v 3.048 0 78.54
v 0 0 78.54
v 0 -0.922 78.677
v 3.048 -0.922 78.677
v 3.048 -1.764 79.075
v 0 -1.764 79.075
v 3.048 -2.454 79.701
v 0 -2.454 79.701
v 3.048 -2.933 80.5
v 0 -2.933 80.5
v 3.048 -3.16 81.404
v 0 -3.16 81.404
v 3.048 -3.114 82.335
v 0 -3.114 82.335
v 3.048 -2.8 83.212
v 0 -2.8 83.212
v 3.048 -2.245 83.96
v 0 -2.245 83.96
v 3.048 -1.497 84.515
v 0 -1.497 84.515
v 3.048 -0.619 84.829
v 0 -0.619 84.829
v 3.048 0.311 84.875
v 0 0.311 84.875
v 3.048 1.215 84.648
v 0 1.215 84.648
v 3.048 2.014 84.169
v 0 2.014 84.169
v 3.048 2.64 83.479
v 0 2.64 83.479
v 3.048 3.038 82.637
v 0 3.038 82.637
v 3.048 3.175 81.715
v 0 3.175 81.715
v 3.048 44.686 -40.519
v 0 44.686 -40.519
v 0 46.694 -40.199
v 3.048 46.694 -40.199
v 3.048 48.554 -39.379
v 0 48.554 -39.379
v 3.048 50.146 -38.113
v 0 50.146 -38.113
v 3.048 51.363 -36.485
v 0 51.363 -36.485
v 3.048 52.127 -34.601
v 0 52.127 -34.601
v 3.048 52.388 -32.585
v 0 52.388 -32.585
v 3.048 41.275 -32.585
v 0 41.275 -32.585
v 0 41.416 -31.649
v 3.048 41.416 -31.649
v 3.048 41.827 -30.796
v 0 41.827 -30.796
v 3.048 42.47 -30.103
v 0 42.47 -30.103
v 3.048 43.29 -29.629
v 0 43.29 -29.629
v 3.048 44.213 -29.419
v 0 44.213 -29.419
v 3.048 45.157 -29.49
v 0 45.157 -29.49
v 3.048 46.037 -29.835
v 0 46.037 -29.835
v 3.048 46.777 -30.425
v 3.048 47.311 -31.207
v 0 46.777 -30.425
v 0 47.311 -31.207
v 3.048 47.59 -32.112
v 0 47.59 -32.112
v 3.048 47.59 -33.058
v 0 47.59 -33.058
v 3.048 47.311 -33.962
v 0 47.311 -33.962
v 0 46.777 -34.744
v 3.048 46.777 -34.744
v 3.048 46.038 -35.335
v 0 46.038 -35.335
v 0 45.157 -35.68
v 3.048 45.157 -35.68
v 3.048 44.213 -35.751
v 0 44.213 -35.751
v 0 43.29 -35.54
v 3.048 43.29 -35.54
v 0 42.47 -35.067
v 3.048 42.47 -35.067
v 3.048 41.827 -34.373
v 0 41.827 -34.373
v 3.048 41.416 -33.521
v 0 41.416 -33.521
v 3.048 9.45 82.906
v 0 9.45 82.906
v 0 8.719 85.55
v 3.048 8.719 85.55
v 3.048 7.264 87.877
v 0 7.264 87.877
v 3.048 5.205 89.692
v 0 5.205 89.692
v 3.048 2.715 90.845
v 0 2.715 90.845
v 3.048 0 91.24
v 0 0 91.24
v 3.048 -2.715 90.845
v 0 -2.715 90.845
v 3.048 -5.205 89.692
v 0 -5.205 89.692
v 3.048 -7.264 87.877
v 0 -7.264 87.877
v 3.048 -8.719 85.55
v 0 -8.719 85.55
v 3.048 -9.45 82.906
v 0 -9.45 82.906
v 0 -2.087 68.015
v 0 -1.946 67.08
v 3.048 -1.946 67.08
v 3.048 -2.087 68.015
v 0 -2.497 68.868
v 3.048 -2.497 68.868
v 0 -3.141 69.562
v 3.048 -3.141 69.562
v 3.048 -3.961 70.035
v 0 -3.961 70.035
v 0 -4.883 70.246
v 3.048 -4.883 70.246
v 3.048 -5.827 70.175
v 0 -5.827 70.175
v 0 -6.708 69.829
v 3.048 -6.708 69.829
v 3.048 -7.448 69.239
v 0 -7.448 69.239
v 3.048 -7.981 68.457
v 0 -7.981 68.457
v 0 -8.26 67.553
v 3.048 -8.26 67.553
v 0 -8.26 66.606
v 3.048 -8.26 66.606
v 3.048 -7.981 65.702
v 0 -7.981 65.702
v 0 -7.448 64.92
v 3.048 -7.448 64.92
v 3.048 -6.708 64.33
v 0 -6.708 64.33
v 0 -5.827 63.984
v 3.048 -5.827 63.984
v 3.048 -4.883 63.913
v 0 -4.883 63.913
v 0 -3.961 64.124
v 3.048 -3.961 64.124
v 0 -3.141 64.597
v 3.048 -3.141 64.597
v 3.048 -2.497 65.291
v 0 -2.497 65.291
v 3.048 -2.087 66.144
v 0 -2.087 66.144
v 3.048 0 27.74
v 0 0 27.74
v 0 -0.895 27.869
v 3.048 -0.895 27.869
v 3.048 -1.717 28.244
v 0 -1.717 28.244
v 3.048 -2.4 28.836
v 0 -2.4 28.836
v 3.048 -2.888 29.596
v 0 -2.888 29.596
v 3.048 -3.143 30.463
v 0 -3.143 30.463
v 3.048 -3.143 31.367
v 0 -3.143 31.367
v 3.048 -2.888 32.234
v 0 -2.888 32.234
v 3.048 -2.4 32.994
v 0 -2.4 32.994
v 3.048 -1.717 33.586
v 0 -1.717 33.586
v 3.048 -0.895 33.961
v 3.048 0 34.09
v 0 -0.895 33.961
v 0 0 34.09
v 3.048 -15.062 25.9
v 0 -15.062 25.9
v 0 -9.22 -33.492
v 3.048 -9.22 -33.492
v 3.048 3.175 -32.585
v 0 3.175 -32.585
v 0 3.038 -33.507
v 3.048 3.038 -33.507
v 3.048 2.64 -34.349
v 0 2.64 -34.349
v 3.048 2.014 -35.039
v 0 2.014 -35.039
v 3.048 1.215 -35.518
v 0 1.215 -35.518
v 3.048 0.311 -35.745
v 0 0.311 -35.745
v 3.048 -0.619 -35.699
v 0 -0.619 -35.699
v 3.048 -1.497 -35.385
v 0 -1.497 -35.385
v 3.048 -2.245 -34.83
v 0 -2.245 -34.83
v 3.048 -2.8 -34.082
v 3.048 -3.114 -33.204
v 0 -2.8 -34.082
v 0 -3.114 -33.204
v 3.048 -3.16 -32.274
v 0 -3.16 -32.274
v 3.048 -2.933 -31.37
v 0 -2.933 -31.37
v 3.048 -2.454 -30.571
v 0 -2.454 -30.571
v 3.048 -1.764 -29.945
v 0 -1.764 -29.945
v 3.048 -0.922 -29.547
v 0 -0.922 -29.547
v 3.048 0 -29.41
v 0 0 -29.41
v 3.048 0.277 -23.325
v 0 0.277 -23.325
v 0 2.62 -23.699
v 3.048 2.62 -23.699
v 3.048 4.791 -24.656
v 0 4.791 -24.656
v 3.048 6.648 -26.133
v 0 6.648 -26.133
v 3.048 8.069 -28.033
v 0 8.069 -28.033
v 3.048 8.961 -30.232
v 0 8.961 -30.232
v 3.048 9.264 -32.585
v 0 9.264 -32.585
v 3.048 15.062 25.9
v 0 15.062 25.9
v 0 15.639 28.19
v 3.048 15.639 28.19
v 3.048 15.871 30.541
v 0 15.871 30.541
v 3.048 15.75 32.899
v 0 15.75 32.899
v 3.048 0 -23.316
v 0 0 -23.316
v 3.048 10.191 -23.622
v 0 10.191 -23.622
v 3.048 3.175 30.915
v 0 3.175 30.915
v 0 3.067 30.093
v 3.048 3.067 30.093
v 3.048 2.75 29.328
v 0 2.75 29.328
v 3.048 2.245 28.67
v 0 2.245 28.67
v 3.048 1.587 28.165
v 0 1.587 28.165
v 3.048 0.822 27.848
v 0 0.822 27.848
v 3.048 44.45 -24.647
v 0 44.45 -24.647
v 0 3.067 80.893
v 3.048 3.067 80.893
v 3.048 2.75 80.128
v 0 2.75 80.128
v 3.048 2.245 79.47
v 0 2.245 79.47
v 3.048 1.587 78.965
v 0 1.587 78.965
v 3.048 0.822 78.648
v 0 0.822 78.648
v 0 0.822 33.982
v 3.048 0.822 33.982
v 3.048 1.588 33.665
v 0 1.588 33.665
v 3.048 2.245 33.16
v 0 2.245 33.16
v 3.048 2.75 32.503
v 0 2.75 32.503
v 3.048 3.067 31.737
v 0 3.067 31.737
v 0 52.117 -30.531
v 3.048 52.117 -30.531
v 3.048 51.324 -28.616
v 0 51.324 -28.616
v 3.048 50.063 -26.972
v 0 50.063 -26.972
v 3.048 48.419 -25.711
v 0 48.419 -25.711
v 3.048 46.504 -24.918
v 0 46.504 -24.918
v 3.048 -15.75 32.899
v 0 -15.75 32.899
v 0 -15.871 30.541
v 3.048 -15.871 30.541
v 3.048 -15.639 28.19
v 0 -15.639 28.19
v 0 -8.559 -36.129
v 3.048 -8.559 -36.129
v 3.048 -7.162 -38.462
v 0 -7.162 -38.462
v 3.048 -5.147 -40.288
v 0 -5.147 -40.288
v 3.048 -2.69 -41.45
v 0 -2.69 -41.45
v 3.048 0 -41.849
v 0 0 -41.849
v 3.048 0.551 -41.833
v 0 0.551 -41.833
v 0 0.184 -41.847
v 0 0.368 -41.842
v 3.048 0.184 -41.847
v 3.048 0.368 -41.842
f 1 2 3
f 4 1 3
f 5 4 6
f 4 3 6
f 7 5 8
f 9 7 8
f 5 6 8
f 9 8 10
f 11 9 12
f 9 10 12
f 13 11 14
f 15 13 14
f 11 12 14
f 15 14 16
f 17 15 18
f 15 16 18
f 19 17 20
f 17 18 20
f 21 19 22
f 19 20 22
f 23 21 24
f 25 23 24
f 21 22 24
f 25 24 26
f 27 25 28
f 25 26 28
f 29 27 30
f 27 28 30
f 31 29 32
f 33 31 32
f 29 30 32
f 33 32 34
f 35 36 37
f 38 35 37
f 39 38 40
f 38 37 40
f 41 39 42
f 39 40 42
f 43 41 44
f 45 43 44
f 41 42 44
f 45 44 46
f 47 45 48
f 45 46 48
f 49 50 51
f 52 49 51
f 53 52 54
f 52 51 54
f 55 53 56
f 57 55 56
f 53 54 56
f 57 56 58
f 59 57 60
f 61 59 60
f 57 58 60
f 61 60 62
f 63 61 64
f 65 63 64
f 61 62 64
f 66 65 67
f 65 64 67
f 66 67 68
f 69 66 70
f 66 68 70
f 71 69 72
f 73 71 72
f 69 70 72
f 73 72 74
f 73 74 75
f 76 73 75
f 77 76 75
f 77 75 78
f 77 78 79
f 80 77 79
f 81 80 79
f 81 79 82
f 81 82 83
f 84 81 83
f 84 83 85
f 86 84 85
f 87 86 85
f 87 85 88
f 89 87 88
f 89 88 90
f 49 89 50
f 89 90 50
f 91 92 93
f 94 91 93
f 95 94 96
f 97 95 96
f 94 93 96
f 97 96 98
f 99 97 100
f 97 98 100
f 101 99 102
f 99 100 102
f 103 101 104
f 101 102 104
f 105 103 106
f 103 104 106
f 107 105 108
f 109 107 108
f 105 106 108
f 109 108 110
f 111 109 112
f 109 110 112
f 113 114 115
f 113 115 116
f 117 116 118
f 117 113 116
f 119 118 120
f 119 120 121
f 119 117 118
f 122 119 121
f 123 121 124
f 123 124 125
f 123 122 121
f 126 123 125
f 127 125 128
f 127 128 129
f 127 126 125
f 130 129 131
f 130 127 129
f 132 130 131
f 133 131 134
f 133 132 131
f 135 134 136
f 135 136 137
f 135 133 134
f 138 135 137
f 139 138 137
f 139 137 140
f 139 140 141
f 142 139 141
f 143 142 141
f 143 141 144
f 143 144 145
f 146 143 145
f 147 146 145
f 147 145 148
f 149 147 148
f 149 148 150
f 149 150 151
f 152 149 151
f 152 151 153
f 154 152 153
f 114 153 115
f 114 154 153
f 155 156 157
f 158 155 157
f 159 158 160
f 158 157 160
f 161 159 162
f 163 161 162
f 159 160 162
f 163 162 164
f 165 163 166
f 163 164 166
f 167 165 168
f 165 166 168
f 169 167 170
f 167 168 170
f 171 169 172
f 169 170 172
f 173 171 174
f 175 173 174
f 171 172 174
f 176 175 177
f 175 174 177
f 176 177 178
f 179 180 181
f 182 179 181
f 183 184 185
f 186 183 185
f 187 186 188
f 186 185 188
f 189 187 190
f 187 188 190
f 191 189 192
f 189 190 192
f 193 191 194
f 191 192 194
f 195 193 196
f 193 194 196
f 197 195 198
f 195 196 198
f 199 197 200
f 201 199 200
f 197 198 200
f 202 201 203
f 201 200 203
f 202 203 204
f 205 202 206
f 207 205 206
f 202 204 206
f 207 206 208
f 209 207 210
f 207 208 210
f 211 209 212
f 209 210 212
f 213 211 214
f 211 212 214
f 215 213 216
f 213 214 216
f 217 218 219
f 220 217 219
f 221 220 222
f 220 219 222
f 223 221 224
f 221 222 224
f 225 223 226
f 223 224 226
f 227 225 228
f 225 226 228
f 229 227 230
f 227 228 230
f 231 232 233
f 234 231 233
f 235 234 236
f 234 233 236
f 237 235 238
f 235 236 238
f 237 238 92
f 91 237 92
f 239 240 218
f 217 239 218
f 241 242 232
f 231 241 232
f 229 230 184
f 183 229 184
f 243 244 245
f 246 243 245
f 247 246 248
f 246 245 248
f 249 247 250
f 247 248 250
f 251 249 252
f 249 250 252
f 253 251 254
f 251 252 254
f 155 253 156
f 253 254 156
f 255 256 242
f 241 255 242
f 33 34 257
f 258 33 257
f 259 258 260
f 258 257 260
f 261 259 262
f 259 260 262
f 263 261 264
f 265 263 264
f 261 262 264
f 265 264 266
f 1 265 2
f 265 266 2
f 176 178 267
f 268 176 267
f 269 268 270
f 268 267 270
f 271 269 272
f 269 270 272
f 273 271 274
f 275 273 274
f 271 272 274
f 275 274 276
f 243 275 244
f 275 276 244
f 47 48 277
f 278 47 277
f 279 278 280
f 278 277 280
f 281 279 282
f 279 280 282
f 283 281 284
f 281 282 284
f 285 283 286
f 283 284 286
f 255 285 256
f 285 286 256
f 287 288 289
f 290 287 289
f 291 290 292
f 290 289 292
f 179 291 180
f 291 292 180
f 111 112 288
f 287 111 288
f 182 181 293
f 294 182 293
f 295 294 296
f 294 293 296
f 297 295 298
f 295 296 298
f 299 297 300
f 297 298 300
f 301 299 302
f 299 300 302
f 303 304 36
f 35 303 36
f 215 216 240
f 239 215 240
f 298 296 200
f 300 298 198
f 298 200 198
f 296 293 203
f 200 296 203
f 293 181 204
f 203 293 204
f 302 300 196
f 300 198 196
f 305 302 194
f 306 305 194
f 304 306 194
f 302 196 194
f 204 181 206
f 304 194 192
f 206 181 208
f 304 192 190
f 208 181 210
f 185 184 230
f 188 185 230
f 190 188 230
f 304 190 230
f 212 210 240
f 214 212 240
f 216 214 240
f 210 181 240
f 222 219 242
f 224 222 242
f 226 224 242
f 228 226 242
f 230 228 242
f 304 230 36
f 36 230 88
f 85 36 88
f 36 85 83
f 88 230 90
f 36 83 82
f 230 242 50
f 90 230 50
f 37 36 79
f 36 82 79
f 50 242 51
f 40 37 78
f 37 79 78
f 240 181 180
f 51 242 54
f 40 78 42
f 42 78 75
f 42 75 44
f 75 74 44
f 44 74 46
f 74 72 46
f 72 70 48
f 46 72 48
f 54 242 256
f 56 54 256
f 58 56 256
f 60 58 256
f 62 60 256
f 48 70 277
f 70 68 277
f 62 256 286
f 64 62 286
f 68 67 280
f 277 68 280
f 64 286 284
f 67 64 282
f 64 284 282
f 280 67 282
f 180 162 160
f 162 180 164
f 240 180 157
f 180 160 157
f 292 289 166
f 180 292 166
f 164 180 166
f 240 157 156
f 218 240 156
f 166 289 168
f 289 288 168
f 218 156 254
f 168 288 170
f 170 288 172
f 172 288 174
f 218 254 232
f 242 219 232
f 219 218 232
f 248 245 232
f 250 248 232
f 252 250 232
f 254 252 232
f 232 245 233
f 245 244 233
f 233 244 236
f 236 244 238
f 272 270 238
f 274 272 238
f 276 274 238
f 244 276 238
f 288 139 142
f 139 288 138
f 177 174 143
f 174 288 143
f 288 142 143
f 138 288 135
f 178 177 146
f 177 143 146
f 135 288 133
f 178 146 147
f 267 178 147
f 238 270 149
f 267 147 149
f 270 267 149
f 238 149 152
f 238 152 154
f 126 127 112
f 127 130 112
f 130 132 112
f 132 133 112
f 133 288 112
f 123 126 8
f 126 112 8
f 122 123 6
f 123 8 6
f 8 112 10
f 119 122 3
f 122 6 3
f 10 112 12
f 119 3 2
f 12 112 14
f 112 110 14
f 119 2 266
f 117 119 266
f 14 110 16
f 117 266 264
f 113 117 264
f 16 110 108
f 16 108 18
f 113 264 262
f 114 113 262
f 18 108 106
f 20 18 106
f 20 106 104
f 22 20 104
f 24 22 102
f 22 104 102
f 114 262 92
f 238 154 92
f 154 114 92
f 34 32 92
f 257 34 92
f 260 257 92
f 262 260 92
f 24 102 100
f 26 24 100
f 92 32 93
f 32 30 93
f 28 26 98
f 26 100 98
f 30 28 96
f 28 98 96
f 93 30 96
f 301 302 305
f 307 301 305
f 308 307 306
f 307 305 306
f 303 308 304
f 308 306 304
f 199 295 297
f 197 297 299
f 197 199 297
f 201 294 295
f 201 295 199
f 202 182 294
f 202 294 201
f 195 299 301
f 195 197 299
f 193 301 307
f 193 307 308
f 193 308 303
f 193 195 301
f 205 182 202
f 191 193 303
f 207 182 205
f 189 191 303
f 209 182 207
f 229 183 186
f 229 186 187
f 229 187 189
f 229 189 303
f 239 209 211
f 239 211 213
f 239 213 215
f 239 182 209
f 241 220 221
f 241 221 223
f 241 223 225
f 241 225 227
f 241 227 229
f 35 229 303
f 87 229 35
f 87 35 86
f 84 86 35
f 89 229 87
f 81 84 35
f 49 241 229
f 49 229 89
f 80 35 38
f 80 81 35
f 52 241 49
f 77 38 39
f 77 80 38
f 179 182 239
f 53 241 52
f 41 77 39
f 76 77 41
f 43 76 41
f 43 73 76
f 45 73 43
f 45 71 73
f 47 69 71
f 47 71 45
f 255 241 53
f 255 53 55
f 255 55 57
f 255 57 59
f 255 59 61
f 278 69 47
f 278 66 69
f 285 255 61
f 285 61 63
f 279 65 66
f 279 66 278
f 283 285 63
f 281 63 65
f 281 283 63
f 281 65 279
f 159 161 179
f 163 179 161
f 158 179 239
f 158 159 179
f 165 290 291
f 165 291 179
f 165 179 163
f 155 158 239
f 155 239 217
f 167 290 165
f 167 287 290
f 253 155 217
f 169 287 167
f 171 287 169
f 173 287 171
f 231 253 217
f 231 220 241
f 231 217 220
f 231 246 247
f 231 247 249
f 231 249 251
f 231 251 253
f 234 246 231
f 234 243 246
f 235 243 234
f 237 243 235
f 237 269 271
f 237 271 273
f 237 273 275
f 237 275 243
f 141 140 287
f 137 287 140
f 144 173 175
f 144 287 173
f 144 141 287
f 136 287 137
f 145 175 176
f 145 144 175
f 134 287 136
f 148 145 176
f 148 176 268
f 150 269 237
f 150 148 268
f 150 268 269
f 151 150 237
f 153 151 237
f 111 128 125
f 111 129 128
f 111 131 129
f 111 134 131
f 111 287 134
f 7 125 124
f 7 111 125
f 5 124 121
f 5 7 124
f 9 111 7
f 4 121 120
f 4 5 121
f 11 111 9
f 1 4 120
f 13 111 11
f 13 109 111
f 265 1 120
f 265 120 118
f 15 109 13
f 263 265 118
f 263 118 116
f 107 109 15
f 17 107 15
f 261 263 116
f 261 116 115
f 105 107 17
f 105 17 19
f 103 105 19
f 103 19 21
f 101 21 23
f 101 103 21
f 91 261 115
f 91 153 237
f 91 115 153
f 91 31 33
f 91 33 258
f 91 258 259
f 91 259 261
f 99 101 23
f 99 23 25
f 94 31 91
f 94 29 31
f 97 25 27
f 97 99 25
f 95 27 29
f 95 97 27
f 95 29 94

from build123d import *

# Parameters (mm, degrees)
F0_R     = 3.175
F1_DEPTH = 3.048


with BuildPart() as f1:
    # F0 (on Right) → F1 (new body)
    with BuildSketch(Plane.YZ):
        with BuildLine():
            ThreePointArc((0, 72.1900944854), (6.7351920908, 74.9799023946), (9.525, 81.7150944854))
            ThreePointArc((9.525, 81.7150944854), (9.5063048942, 82.3115777274), (9.4502929642, 82.9057194854))
            ThreePointArc((9.4502929642, 82.9057194854), (0, 91.2400944854), (-9.4502929642, 82.9057194854))
            ThreePointArc((-9.4502929642, 82.9057194854), (-7.14375, 75.4148991759), (0, 72.1900944854))
        make_face()
        with BuildLine():
            ThreePointArc((3.175, 81.7150944854), (2.2450640303, 79.4700304552), (0, 78.5400944854))
            ThreePointArc((0, 78.5400944854), (-2.2450640303, 83.9601585157), (3.175, 81.7150944854))
        make_face(mode=Mode.SUBTRACT)
        with BuildLine():
            ThreePointArc((9.4502929642, 82.9057194854), (9.5063048942, 82.3115777274), (9.525, 81.7150944854))
            ThreePointArc((9.525, 81.7150944854), (6.7351920908, 74.9799023946), (0, 72.1900944854))
            Line((0, 72.1900944854), (0, 46.7900944854))
            Line((0, 46.7900944854), (0, 34.0900944854))
            ThreePointArc((0, 34.0900944854), (2.2450640303, 33.1601585157), (3.175, 30.9150944854))
            ThreePointArc((3.175, 30.9150944854), (2.2450640303, 28.6700304552), (0, 27.7400944854))
            Line((0, 27.7400944854), (0, 15.0400944854))
            ThreePointArc((0, 15.0400944854), (9.2843476683, 18.0381183895), (15.0619619516, 25.899825084))
            Line((15.0619619516, 25.899825084), (15.7504882737, 32.8994694854))
            Line((15.7504882737, 32.8994694854), (9.4502929642, 82.9057194854))
        make_face()
        with BuildLine():
            Line((0, 46.7900944854), (0, 72.1900944854))
            ThreePointArc((0, 72.1900944854), (-7.14375, 75.4148991759), (-9.4502929642, 82.9057194854))
            Line((-9.4502929642, 82.9057194854), (-15.7504882737, 32.8994694854))
            ThreePointArc((-15.7504882737, 32.8994694854), (-10.5003255158, 42.8213444854), (0, 46.7900944854))
        make_face()
        with Locations((-5.1205755983, 67.0795790052)):
            Circle(F0_R, mode=Mode.SUBTRACT)
        with BuildLine():
            ThreePointArc((15.0619619516, 25.899825084), (15.7987508259, 29.3610361396), (15.7504882737, 32.8994694854))
            Line((15.7504882737, 32.8994694854), (15.0619619516, 25.899825084))
        make_face()
        with BuildLine():
            Line((0, 34.0900944854), (0, 46.7900944854))
            ThreePointArc((0, 46.7900944854), (-10.5003255158, 42.8213444854), (-15.7504882737, 32.8994694854))
            Line((-15.7504882737, 32.8994694854), (-15.0619619516, 25.899825084))
            ThreePointArc((-15.0619619516, 25.899825084), (-9.2843476683, 18.0381183895), (0, 15.0400944854))
            Line((0, 15.0400944854), (0, 27.7400944854))
            ThreePointArc((0, 27.7400944854), (-3.175, 30.9150944854), (0, 34.0900944854))
        make_face()
        with BuildLine():
            Line((-15.0619619516, 25.899825084), (-15.7504882737, 32.8994694854))
            ThreePointArc((-15.7504882737, 32.8994694854), (-15.7987508259, 29.3610361396), (-15.0619619516, 25.899825084))
        make_face()
        with BuildLine():
            Line((10.1907467619, -23.6215556334), (15.0619619516, 25.899825084))
            ThreePointArc((15.0619619516, 25.899825084), (9.2843476683, 18.0381183895), (0, 15.0400944854))
            Line((0, 15.0400944854), (0, -23.3164066483))
            Line((0, -23.3164066483), (0.2772849675, -23.3247095949))
            Line((0.2772849675, -23.3247095949), (10.1907467619, -23.6215556334))
        make_face()
        with BuildLine():
            ThreePointArc((0, 15.0400944854), (-9.2843476683, 18.0381183895), (-15.0619619516, 25.899825084))
            Line((-15.0619619516, 25.899825084), (-9.2198489049, -33.4918242511))
            ThreePointArc((-9.2198489049, -33.4918242511), (-6.8640412592, -26.3629240764), (0, -23.3205590496))
            Line((0, -23.3205590496), (0, -23.3164066483))
            Line((0, -23.3164066483), (0, 15.0400944854))
        make_face()
        with BuildLine():
            Line((44.45, -24.6474055146), (10.1907467619, -23.6215556334))
            Line((10.1907467619, -23.6215556334), (9.3090587828, -32.5849055146))
            Line((9.3090587828, -32.5849055146), (36.5125, -32.5849055146))
            ThreePointArc((36.5125, -32.5849055146), (38.8373399243, -26.9722454389), (44.45, -24.6474055146))
        make_face()
        with BuildLine():
            Line((9.3090587828, -32.5849055146), (10.1907467619, -23.6215556334))
            Line((10.1907467619, -23.6215556334), (0.2772849675, -23.3247095949))
            ThreePointArc((0.2772849675, -23.3247095949), (6.6481944704, -26.1328030892), (9.264346465, -32.5849055146))
            Line((9.264346465, -32.5849055146), (9.3090587828, -32.5849055146))
        make_face()
        with BuildLine():
            ThreePointArc((0, -23.3205590496), (-6.8640412592, -26.3629240764), (-9.2198489049, -33.4918242511))
            ThreePointArc((-9.2198489049, -33.4918242511), (-6.2219814381, -39.4489467737), (0, -41.8492519796))
            Line((0, -41.8492519796), (0.5511328595, -41.8328440954))
            ThreePointArc((0.5511328595, -41.8328440954), (6.742922259, -38.937945325), (9.264346465, -32.5849055146))
            Line((9.264346465, -32.5849055146), (3.175, -32.5849055146))
            ThreePointArc((3.175, -32.5849055146), (-2.2450640303, -34.8299695448), (0, -29.4099055146))
            Line((0, -29.4099055146), (0, -23.3205590496))
        make_face()
        with BuildLine():
            Line((36.5125, -32.5849055146), (9.3090587828, -32.5849055146))
            Line((9.3090587828, -32.5849055146), (9.264346465, -32.5849055146))
            ThreePointArc((9.264346465, -32.5849055146), (6.742922259, -38.937945325), (0.5511328595, -41.8328440954))
            Line((0.5511328595, -41.8328440954), (44.6862042117, -40.5188902524))
            ThreePointArc((44.6862042117, -40.5188902524), (38.9214814227, -38.2804641869), (36.5125, -32.5849055146))
        make_face()
        with BuildLine():
            ThreePointArc((52.3875, -32.5849055146), (50.0626600757, -26.9722454389), (44.45, -24.6474055146))
            ThreePointArc((44.45, -24.6474055146), (38.8373399243, -26.9722454389), (36.5125, -32.5849055146))
            ThreePointArc((36.5125, -32.5849055146), (38.9214814227, -38.2804641869), (44.6862042117, -40.5188902524))
            ThreePointArc((44.6862042117, -40.5188902524), (50.1455586723, -38.1134240919), (52.3875, -32.5849055146))
        make_face()
        with BuildLine():
            ThreePointArc((47.625, -32.5849055146), (44.45, -35.7599055146), (41.275, -32.5849055146))
            ThreePointArc((41.275, -32.5849055146), (44.45, -29.4099055146), (47.625, -32.5849055146))
        make_face(mode=Mode.SUBTRACT)
        with BuildLine():
            Line((0.5511328595, -41.8328440954), (0, -41.8492519796))
            ThreePointArc((0, -41.8492519796), (0.2756885233, -41.8451491), (0.5511328595, -41.8328440954))
        make_face()
    extrude(amount=F1_DEPTH)


solid = f1.part
